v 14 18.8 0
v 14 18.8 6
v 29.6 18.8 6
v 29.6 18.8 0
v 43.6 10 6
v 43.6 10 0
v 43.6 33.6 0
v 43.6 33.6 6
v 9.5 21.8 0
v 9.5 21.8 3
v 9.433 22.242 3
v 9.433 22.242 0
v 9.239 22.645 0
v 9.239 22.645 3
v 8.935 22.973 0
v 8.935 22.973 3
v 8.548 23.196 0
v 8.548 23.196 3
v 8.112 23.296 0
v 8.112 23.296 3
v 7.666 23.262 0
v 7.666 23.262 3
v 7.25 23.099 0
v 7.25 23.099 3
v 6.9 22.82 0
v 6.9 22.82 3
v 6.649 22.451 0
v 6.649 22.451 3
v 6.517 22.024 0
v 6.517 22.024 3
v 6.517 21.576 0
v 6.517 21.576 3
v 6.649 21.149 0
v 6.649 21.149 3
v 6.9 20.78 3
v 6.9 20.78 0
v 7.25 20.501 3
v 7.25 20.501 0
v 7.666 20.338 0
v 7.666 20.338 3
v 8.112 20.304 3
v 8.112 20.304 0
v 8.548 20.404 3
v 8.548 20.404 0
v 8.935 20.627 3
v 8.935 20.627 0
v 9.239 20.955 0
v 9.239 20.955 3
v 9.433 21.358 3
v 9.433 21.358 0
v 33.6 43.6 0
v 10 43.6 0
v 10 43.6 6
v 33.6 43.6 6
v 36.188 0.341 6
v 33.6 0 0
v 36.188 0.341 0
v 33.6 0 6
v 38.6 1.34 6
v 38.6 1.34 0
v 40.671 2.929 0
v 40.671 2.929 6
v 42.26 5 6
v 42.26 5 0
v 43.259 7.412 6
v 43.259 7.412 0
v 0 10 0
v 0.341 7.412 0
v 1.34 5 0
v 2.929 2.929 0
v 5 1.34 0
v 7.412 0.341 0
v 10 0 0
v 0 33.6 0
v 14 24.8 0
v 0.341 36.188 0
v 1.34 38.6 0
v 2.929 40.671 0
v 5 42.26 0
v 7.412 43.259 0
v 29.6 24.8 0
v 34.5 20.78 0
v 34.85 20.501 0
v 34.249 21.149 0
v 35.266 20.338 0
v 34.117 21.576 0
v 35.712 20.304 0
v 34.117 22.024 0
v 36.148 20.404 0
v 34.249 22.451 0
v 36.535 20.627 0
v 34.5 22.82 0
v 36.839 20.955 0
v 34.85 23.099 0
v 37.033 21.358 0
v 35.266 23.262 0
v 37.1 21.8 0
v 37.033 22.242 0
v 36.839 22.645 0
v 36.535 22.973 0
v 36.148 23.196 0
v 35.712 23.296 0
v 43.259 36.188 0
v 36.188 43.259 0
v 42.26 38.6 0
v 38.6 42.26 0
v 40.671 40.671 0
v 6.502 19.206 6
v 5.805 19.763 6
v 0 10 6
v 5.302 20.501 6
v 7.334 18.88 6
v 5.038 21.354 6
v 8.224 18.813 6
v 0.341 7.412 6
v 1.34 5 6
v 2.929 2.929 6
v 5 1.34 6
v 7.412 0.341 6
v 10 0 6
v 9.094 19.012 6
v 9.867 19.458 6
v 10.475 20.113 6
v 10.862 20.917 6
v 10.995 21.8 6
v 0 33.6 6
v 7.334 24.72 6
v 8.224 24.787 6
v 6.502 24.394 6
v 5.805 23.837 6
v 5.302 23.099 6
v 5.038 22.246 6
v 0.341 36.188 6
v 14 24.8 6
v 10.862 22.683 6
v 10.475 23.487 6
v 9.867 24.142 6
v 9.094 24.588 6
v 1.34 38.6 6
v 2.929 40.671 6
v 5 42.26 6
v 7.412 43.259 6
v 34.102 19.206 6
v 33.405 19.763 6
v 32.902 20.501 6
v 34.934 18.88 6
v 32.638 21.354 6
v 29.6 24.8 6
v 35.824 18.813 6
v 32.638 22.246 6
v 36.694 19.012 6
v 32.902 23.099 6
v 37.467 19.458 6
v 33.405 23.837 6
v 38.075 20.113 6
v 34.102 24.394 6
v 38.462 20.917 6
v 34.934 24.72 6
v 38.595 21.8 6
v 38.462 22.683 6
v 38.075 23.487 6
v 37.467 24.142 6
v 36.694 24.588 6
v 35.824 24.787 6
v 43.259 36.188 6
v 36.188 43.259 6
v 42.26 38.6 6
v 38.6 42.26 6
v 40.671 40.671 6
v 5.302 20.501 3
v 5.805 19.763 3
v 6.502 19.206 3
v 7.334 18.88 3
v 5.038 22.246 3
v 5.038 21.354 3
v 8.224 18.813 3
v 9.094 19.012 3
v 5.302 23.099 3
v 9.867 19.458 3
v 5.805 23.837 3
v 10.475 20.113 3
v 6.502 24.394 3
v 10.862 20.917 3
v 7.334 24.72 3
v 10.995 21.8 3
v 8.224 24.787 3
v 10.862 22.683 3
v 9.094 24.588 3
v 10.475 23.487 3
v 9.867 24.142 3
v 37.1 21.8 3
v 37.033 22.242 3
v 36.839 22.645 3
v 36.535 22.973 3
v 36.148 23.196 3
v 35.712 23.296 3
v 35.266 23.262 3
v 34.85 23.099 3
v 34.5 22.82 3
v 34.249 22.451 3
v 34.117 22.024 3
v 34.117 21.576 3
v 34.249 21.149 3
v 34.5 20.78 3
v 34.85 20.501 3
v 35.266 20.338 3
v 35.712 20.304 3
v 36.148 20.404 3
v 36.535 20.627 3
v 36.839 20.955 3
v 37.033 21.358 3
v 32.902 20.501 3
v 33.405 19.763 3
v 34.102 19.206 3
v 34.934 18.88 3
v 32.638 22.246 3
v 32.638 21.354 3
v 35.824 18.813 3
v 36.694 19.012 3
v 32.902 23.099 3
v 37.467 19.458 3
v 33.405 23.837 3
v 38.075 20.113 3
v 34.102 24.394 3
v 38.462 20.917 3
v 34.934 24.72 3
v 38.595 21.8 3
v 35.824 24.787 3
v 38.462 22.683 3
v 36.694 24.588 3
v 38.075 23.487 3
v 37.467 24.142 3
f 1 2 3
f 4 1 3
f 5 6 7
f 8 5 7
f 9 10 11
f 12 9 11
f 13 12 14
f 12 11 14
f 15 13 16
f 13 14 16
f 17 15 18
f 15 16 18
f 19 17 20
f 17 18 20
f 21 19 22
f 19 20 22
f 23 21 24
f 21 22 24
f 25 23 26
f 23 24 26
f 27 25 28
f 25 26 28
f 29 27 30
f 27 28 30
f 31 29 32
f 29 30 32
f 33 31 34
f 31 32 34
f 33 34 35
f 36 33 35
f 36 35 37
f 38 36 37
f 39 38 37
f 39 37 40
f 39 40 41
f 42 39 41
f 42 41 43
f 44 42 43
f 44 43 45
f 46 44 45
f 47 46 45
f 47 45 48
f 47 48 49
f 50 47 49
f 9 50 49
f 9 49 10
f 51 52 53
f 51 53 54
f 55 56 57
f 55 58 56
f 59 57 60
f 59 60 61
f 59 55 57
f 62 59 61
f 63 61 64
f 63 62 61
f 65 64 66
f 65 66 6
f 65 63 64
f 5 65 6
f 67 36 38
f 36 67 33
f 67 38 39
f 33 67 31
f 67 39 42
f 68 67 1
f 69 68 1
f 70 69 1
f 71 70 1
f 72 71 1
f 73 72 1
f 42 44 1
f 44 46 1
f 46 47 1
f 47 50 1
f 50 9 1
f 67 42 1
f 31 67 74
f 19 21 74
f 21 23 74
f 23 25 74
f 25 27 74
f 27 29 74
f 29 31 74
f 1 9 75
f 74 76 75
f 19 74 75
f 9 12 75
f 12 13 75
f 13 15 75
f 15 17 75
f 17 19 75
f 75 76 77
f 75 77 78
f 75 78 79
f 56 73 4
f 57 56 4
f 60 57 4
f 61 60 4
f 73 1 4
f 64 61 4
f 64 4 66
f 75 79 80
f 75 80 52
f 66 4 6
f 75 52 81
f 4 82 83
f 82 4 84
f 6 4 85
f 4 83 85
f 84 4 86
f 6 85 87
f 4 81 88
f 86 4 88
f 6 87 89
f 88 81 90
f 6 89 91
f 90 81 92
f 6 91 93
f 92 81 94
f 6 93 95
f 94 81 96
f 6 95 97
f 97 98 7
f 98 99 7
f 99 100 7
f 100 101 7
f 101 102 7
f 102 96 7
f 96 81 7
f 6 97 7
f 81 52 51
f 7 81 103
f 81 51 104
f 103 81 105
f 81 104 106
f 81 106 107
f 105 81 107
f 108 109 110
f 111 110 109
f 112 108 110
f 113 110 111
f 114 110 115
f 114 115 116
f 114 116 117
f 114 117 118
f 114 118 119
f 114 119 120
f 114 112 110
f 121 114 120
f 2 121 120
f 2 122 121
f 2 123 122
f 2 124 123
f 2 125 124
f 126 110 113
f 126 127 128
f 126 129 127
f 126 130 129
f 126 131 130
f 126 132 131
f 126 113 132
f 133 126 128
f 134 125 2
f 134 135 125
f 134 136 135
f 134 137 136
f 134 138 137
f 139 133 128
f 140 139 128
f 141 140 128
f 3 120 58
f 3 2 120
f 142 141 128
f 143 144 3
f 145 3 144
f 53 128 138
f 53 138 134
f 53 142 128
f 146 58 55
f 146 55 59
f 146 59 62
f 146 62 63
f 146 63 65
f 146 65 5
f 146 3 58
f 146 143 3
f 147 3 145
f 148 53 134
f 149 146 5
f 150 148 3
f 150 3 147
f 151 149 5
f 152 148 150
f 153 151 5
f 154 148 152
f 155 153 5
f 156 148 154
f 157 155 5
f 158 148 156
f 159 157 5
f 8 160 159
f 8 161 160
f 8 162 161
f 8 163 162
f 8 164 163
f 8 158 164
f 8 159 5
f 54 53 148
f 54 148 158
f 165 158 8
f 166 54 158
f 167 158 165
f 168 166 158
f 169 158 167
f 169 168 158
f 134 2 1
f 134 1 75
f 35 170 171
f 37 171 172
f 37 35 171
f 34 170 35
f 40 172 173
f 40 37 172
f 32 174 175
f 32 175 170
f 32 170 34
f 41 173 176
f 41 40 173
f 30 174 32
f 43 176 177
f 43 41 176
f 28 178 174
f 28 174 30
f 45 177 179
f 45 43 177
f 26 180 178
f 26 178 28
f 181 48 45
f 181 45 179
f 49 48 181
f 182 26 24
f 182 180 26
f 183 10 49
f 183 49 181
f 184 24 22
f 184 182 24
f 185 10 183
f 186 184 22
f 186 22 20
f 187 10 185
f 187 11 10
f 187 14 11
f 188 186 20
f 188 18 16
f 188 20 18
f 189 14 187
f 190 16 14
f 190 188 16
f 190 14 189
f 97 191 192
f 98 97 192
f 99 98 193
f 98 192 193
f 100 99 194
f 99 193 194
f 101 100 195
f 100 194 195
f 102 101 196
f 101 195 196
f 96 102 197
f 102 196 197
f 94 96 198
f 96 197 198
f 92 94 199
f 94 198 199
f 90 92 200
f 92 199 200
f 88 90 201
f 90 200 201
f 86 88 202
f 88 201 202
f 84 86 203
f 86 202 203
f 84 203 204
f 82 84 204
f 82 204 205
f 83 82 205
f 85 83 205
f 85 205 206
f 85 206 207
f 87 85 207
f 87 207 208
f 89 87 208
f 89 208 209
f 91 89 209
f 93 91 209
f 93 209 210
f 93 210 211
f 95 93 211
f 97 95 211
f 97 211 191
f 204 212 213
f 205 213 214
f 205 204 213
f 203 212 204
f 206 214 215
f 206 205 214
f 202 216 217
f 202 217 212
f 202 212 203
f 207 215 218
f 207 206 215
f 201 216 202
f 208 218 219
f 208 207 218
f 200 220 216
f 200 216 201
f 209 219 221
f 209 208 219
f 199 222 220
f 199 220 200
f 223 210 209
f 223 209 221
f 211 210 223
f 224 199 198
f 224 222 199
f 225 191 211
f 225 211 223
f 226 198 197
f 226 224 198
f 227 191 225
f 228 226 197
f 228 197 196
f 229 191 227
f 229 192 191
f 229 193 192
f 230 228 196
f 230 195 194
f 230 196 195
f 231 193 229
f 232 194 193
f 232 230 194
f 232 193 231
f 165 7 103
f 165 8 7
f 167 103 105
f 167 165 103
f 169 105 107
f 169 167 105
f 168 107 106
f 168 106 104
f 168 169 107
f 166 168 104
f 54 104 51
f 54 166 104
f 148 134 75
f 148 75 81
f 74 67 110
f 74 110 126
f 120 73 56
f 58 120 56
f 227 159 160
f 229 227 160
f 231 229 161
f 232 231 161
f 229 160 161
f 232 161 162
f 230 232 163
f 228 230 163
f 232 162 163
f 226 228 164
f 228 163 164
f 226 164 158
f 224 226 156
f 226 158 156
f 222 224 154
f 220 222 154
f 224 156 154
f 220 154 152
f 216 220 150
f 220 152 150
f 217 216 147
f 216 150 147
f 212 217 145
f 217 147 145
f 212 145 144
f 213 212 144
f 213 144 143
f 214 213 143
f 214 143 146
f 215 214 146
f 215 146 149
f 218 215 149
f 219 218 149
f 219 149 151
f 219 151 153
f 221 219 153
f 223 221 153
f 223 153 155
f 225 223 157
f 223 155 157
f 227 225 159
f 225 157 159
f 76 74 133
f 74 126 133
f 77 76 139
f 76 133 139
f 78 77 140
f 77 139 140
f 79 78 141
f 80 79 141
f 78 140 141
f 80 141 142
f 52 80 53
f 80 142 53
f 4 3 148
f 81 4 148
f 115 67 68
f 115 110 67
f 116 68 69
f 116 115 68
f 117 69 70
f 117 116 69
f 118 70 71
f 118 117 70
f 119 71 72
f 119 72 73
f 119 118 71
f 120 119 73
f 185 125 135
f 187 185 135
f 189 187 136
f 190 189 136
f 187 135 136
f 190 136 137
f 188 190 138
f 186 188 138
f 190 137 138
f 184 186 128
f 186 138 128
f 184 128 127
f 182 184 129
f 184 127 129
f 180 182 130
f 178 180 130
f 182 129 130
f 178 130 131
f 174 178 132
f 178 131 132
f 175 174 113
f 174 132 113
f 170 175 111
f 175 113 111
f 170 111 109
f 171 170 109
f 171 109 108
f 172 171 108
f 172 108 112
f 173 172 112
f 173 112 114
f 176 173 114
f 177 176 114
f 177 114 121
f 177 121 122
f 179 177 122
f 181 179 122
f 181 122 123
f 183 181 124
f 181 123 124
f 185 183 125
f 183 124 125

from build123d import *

# Parameters (mm, degrees)
ESQUISSE1_W             = 43.6
ESQUISSE1_H             = 43.6
BOSS_EXTRU_1_DEPTH      = 6
CONG_1_R                = 10
ESQUISSE2_R             = 1.5
ESQUISSE2_W             = 15.6
ESQUISSE2_H             = 6
ENL_V_MAT_EXTRU_1_DEPTH = 6
ESQUISSE3_R             = 2.995
ENL_V_MAT_EXTRU_2_DEPTH = 3


with BuildPart() as part:
    # Esquisse1 → Boss.-Extru.1 (new body)
    with BuildSketch(Plane.XY):
        with Locations((21.8, 21.8)):
            Rectangle(ESQUISSE1_W, ESQUISSE1_H)
    extrude(amount=BOSS_EXTRU_1_DEPTH)

    # Congé1
    cong_1_edges = [part.edges().sort_by_distance(p)[0] for p in [
        (0, 43.6, 3),
        (43.6, 43.6, 3),
        (43.6, 0, 3),
        (0, 0, 3),
    ]]
    fillet(cong_1_edges, radius=CONG_1_R)

    # Esquisse2 → Enlèv. mat.-Extru.1 (cut)
    with BuildSketch(Plane.XY.offset(6)):
        with Locations((8, 21.8)):
            Circle(ESQUISSE2_R)
        with Locations((35.6, 21.8)):
            Circle(ESQUISSE2_R)
        with Locations((21.8, 21.8)):
            Rectangle(ESQUISSE2_W, ESQUISSE2_H)
    extrude(amount=-ENL_V_MAT_EXTRU_1_DEPTH, mode=Mode.SUBTRACT)

    # Esquisse3 → Enlèv. mat.-Extru.2 (cut)
    with BuildSketch(Plane.XY.offset(6)):
        with Locations((8, 21.8)):
            Circle(ESQUISSE3_R)
        with Locations((35.6, 21.8)):
            Circle(ESQUISSE3_R)
    extrude(amount=-ENL_V_MAT_EXTRU_2_DEPTH, mode=Mode.SUBTRACT)


solid = part.part
